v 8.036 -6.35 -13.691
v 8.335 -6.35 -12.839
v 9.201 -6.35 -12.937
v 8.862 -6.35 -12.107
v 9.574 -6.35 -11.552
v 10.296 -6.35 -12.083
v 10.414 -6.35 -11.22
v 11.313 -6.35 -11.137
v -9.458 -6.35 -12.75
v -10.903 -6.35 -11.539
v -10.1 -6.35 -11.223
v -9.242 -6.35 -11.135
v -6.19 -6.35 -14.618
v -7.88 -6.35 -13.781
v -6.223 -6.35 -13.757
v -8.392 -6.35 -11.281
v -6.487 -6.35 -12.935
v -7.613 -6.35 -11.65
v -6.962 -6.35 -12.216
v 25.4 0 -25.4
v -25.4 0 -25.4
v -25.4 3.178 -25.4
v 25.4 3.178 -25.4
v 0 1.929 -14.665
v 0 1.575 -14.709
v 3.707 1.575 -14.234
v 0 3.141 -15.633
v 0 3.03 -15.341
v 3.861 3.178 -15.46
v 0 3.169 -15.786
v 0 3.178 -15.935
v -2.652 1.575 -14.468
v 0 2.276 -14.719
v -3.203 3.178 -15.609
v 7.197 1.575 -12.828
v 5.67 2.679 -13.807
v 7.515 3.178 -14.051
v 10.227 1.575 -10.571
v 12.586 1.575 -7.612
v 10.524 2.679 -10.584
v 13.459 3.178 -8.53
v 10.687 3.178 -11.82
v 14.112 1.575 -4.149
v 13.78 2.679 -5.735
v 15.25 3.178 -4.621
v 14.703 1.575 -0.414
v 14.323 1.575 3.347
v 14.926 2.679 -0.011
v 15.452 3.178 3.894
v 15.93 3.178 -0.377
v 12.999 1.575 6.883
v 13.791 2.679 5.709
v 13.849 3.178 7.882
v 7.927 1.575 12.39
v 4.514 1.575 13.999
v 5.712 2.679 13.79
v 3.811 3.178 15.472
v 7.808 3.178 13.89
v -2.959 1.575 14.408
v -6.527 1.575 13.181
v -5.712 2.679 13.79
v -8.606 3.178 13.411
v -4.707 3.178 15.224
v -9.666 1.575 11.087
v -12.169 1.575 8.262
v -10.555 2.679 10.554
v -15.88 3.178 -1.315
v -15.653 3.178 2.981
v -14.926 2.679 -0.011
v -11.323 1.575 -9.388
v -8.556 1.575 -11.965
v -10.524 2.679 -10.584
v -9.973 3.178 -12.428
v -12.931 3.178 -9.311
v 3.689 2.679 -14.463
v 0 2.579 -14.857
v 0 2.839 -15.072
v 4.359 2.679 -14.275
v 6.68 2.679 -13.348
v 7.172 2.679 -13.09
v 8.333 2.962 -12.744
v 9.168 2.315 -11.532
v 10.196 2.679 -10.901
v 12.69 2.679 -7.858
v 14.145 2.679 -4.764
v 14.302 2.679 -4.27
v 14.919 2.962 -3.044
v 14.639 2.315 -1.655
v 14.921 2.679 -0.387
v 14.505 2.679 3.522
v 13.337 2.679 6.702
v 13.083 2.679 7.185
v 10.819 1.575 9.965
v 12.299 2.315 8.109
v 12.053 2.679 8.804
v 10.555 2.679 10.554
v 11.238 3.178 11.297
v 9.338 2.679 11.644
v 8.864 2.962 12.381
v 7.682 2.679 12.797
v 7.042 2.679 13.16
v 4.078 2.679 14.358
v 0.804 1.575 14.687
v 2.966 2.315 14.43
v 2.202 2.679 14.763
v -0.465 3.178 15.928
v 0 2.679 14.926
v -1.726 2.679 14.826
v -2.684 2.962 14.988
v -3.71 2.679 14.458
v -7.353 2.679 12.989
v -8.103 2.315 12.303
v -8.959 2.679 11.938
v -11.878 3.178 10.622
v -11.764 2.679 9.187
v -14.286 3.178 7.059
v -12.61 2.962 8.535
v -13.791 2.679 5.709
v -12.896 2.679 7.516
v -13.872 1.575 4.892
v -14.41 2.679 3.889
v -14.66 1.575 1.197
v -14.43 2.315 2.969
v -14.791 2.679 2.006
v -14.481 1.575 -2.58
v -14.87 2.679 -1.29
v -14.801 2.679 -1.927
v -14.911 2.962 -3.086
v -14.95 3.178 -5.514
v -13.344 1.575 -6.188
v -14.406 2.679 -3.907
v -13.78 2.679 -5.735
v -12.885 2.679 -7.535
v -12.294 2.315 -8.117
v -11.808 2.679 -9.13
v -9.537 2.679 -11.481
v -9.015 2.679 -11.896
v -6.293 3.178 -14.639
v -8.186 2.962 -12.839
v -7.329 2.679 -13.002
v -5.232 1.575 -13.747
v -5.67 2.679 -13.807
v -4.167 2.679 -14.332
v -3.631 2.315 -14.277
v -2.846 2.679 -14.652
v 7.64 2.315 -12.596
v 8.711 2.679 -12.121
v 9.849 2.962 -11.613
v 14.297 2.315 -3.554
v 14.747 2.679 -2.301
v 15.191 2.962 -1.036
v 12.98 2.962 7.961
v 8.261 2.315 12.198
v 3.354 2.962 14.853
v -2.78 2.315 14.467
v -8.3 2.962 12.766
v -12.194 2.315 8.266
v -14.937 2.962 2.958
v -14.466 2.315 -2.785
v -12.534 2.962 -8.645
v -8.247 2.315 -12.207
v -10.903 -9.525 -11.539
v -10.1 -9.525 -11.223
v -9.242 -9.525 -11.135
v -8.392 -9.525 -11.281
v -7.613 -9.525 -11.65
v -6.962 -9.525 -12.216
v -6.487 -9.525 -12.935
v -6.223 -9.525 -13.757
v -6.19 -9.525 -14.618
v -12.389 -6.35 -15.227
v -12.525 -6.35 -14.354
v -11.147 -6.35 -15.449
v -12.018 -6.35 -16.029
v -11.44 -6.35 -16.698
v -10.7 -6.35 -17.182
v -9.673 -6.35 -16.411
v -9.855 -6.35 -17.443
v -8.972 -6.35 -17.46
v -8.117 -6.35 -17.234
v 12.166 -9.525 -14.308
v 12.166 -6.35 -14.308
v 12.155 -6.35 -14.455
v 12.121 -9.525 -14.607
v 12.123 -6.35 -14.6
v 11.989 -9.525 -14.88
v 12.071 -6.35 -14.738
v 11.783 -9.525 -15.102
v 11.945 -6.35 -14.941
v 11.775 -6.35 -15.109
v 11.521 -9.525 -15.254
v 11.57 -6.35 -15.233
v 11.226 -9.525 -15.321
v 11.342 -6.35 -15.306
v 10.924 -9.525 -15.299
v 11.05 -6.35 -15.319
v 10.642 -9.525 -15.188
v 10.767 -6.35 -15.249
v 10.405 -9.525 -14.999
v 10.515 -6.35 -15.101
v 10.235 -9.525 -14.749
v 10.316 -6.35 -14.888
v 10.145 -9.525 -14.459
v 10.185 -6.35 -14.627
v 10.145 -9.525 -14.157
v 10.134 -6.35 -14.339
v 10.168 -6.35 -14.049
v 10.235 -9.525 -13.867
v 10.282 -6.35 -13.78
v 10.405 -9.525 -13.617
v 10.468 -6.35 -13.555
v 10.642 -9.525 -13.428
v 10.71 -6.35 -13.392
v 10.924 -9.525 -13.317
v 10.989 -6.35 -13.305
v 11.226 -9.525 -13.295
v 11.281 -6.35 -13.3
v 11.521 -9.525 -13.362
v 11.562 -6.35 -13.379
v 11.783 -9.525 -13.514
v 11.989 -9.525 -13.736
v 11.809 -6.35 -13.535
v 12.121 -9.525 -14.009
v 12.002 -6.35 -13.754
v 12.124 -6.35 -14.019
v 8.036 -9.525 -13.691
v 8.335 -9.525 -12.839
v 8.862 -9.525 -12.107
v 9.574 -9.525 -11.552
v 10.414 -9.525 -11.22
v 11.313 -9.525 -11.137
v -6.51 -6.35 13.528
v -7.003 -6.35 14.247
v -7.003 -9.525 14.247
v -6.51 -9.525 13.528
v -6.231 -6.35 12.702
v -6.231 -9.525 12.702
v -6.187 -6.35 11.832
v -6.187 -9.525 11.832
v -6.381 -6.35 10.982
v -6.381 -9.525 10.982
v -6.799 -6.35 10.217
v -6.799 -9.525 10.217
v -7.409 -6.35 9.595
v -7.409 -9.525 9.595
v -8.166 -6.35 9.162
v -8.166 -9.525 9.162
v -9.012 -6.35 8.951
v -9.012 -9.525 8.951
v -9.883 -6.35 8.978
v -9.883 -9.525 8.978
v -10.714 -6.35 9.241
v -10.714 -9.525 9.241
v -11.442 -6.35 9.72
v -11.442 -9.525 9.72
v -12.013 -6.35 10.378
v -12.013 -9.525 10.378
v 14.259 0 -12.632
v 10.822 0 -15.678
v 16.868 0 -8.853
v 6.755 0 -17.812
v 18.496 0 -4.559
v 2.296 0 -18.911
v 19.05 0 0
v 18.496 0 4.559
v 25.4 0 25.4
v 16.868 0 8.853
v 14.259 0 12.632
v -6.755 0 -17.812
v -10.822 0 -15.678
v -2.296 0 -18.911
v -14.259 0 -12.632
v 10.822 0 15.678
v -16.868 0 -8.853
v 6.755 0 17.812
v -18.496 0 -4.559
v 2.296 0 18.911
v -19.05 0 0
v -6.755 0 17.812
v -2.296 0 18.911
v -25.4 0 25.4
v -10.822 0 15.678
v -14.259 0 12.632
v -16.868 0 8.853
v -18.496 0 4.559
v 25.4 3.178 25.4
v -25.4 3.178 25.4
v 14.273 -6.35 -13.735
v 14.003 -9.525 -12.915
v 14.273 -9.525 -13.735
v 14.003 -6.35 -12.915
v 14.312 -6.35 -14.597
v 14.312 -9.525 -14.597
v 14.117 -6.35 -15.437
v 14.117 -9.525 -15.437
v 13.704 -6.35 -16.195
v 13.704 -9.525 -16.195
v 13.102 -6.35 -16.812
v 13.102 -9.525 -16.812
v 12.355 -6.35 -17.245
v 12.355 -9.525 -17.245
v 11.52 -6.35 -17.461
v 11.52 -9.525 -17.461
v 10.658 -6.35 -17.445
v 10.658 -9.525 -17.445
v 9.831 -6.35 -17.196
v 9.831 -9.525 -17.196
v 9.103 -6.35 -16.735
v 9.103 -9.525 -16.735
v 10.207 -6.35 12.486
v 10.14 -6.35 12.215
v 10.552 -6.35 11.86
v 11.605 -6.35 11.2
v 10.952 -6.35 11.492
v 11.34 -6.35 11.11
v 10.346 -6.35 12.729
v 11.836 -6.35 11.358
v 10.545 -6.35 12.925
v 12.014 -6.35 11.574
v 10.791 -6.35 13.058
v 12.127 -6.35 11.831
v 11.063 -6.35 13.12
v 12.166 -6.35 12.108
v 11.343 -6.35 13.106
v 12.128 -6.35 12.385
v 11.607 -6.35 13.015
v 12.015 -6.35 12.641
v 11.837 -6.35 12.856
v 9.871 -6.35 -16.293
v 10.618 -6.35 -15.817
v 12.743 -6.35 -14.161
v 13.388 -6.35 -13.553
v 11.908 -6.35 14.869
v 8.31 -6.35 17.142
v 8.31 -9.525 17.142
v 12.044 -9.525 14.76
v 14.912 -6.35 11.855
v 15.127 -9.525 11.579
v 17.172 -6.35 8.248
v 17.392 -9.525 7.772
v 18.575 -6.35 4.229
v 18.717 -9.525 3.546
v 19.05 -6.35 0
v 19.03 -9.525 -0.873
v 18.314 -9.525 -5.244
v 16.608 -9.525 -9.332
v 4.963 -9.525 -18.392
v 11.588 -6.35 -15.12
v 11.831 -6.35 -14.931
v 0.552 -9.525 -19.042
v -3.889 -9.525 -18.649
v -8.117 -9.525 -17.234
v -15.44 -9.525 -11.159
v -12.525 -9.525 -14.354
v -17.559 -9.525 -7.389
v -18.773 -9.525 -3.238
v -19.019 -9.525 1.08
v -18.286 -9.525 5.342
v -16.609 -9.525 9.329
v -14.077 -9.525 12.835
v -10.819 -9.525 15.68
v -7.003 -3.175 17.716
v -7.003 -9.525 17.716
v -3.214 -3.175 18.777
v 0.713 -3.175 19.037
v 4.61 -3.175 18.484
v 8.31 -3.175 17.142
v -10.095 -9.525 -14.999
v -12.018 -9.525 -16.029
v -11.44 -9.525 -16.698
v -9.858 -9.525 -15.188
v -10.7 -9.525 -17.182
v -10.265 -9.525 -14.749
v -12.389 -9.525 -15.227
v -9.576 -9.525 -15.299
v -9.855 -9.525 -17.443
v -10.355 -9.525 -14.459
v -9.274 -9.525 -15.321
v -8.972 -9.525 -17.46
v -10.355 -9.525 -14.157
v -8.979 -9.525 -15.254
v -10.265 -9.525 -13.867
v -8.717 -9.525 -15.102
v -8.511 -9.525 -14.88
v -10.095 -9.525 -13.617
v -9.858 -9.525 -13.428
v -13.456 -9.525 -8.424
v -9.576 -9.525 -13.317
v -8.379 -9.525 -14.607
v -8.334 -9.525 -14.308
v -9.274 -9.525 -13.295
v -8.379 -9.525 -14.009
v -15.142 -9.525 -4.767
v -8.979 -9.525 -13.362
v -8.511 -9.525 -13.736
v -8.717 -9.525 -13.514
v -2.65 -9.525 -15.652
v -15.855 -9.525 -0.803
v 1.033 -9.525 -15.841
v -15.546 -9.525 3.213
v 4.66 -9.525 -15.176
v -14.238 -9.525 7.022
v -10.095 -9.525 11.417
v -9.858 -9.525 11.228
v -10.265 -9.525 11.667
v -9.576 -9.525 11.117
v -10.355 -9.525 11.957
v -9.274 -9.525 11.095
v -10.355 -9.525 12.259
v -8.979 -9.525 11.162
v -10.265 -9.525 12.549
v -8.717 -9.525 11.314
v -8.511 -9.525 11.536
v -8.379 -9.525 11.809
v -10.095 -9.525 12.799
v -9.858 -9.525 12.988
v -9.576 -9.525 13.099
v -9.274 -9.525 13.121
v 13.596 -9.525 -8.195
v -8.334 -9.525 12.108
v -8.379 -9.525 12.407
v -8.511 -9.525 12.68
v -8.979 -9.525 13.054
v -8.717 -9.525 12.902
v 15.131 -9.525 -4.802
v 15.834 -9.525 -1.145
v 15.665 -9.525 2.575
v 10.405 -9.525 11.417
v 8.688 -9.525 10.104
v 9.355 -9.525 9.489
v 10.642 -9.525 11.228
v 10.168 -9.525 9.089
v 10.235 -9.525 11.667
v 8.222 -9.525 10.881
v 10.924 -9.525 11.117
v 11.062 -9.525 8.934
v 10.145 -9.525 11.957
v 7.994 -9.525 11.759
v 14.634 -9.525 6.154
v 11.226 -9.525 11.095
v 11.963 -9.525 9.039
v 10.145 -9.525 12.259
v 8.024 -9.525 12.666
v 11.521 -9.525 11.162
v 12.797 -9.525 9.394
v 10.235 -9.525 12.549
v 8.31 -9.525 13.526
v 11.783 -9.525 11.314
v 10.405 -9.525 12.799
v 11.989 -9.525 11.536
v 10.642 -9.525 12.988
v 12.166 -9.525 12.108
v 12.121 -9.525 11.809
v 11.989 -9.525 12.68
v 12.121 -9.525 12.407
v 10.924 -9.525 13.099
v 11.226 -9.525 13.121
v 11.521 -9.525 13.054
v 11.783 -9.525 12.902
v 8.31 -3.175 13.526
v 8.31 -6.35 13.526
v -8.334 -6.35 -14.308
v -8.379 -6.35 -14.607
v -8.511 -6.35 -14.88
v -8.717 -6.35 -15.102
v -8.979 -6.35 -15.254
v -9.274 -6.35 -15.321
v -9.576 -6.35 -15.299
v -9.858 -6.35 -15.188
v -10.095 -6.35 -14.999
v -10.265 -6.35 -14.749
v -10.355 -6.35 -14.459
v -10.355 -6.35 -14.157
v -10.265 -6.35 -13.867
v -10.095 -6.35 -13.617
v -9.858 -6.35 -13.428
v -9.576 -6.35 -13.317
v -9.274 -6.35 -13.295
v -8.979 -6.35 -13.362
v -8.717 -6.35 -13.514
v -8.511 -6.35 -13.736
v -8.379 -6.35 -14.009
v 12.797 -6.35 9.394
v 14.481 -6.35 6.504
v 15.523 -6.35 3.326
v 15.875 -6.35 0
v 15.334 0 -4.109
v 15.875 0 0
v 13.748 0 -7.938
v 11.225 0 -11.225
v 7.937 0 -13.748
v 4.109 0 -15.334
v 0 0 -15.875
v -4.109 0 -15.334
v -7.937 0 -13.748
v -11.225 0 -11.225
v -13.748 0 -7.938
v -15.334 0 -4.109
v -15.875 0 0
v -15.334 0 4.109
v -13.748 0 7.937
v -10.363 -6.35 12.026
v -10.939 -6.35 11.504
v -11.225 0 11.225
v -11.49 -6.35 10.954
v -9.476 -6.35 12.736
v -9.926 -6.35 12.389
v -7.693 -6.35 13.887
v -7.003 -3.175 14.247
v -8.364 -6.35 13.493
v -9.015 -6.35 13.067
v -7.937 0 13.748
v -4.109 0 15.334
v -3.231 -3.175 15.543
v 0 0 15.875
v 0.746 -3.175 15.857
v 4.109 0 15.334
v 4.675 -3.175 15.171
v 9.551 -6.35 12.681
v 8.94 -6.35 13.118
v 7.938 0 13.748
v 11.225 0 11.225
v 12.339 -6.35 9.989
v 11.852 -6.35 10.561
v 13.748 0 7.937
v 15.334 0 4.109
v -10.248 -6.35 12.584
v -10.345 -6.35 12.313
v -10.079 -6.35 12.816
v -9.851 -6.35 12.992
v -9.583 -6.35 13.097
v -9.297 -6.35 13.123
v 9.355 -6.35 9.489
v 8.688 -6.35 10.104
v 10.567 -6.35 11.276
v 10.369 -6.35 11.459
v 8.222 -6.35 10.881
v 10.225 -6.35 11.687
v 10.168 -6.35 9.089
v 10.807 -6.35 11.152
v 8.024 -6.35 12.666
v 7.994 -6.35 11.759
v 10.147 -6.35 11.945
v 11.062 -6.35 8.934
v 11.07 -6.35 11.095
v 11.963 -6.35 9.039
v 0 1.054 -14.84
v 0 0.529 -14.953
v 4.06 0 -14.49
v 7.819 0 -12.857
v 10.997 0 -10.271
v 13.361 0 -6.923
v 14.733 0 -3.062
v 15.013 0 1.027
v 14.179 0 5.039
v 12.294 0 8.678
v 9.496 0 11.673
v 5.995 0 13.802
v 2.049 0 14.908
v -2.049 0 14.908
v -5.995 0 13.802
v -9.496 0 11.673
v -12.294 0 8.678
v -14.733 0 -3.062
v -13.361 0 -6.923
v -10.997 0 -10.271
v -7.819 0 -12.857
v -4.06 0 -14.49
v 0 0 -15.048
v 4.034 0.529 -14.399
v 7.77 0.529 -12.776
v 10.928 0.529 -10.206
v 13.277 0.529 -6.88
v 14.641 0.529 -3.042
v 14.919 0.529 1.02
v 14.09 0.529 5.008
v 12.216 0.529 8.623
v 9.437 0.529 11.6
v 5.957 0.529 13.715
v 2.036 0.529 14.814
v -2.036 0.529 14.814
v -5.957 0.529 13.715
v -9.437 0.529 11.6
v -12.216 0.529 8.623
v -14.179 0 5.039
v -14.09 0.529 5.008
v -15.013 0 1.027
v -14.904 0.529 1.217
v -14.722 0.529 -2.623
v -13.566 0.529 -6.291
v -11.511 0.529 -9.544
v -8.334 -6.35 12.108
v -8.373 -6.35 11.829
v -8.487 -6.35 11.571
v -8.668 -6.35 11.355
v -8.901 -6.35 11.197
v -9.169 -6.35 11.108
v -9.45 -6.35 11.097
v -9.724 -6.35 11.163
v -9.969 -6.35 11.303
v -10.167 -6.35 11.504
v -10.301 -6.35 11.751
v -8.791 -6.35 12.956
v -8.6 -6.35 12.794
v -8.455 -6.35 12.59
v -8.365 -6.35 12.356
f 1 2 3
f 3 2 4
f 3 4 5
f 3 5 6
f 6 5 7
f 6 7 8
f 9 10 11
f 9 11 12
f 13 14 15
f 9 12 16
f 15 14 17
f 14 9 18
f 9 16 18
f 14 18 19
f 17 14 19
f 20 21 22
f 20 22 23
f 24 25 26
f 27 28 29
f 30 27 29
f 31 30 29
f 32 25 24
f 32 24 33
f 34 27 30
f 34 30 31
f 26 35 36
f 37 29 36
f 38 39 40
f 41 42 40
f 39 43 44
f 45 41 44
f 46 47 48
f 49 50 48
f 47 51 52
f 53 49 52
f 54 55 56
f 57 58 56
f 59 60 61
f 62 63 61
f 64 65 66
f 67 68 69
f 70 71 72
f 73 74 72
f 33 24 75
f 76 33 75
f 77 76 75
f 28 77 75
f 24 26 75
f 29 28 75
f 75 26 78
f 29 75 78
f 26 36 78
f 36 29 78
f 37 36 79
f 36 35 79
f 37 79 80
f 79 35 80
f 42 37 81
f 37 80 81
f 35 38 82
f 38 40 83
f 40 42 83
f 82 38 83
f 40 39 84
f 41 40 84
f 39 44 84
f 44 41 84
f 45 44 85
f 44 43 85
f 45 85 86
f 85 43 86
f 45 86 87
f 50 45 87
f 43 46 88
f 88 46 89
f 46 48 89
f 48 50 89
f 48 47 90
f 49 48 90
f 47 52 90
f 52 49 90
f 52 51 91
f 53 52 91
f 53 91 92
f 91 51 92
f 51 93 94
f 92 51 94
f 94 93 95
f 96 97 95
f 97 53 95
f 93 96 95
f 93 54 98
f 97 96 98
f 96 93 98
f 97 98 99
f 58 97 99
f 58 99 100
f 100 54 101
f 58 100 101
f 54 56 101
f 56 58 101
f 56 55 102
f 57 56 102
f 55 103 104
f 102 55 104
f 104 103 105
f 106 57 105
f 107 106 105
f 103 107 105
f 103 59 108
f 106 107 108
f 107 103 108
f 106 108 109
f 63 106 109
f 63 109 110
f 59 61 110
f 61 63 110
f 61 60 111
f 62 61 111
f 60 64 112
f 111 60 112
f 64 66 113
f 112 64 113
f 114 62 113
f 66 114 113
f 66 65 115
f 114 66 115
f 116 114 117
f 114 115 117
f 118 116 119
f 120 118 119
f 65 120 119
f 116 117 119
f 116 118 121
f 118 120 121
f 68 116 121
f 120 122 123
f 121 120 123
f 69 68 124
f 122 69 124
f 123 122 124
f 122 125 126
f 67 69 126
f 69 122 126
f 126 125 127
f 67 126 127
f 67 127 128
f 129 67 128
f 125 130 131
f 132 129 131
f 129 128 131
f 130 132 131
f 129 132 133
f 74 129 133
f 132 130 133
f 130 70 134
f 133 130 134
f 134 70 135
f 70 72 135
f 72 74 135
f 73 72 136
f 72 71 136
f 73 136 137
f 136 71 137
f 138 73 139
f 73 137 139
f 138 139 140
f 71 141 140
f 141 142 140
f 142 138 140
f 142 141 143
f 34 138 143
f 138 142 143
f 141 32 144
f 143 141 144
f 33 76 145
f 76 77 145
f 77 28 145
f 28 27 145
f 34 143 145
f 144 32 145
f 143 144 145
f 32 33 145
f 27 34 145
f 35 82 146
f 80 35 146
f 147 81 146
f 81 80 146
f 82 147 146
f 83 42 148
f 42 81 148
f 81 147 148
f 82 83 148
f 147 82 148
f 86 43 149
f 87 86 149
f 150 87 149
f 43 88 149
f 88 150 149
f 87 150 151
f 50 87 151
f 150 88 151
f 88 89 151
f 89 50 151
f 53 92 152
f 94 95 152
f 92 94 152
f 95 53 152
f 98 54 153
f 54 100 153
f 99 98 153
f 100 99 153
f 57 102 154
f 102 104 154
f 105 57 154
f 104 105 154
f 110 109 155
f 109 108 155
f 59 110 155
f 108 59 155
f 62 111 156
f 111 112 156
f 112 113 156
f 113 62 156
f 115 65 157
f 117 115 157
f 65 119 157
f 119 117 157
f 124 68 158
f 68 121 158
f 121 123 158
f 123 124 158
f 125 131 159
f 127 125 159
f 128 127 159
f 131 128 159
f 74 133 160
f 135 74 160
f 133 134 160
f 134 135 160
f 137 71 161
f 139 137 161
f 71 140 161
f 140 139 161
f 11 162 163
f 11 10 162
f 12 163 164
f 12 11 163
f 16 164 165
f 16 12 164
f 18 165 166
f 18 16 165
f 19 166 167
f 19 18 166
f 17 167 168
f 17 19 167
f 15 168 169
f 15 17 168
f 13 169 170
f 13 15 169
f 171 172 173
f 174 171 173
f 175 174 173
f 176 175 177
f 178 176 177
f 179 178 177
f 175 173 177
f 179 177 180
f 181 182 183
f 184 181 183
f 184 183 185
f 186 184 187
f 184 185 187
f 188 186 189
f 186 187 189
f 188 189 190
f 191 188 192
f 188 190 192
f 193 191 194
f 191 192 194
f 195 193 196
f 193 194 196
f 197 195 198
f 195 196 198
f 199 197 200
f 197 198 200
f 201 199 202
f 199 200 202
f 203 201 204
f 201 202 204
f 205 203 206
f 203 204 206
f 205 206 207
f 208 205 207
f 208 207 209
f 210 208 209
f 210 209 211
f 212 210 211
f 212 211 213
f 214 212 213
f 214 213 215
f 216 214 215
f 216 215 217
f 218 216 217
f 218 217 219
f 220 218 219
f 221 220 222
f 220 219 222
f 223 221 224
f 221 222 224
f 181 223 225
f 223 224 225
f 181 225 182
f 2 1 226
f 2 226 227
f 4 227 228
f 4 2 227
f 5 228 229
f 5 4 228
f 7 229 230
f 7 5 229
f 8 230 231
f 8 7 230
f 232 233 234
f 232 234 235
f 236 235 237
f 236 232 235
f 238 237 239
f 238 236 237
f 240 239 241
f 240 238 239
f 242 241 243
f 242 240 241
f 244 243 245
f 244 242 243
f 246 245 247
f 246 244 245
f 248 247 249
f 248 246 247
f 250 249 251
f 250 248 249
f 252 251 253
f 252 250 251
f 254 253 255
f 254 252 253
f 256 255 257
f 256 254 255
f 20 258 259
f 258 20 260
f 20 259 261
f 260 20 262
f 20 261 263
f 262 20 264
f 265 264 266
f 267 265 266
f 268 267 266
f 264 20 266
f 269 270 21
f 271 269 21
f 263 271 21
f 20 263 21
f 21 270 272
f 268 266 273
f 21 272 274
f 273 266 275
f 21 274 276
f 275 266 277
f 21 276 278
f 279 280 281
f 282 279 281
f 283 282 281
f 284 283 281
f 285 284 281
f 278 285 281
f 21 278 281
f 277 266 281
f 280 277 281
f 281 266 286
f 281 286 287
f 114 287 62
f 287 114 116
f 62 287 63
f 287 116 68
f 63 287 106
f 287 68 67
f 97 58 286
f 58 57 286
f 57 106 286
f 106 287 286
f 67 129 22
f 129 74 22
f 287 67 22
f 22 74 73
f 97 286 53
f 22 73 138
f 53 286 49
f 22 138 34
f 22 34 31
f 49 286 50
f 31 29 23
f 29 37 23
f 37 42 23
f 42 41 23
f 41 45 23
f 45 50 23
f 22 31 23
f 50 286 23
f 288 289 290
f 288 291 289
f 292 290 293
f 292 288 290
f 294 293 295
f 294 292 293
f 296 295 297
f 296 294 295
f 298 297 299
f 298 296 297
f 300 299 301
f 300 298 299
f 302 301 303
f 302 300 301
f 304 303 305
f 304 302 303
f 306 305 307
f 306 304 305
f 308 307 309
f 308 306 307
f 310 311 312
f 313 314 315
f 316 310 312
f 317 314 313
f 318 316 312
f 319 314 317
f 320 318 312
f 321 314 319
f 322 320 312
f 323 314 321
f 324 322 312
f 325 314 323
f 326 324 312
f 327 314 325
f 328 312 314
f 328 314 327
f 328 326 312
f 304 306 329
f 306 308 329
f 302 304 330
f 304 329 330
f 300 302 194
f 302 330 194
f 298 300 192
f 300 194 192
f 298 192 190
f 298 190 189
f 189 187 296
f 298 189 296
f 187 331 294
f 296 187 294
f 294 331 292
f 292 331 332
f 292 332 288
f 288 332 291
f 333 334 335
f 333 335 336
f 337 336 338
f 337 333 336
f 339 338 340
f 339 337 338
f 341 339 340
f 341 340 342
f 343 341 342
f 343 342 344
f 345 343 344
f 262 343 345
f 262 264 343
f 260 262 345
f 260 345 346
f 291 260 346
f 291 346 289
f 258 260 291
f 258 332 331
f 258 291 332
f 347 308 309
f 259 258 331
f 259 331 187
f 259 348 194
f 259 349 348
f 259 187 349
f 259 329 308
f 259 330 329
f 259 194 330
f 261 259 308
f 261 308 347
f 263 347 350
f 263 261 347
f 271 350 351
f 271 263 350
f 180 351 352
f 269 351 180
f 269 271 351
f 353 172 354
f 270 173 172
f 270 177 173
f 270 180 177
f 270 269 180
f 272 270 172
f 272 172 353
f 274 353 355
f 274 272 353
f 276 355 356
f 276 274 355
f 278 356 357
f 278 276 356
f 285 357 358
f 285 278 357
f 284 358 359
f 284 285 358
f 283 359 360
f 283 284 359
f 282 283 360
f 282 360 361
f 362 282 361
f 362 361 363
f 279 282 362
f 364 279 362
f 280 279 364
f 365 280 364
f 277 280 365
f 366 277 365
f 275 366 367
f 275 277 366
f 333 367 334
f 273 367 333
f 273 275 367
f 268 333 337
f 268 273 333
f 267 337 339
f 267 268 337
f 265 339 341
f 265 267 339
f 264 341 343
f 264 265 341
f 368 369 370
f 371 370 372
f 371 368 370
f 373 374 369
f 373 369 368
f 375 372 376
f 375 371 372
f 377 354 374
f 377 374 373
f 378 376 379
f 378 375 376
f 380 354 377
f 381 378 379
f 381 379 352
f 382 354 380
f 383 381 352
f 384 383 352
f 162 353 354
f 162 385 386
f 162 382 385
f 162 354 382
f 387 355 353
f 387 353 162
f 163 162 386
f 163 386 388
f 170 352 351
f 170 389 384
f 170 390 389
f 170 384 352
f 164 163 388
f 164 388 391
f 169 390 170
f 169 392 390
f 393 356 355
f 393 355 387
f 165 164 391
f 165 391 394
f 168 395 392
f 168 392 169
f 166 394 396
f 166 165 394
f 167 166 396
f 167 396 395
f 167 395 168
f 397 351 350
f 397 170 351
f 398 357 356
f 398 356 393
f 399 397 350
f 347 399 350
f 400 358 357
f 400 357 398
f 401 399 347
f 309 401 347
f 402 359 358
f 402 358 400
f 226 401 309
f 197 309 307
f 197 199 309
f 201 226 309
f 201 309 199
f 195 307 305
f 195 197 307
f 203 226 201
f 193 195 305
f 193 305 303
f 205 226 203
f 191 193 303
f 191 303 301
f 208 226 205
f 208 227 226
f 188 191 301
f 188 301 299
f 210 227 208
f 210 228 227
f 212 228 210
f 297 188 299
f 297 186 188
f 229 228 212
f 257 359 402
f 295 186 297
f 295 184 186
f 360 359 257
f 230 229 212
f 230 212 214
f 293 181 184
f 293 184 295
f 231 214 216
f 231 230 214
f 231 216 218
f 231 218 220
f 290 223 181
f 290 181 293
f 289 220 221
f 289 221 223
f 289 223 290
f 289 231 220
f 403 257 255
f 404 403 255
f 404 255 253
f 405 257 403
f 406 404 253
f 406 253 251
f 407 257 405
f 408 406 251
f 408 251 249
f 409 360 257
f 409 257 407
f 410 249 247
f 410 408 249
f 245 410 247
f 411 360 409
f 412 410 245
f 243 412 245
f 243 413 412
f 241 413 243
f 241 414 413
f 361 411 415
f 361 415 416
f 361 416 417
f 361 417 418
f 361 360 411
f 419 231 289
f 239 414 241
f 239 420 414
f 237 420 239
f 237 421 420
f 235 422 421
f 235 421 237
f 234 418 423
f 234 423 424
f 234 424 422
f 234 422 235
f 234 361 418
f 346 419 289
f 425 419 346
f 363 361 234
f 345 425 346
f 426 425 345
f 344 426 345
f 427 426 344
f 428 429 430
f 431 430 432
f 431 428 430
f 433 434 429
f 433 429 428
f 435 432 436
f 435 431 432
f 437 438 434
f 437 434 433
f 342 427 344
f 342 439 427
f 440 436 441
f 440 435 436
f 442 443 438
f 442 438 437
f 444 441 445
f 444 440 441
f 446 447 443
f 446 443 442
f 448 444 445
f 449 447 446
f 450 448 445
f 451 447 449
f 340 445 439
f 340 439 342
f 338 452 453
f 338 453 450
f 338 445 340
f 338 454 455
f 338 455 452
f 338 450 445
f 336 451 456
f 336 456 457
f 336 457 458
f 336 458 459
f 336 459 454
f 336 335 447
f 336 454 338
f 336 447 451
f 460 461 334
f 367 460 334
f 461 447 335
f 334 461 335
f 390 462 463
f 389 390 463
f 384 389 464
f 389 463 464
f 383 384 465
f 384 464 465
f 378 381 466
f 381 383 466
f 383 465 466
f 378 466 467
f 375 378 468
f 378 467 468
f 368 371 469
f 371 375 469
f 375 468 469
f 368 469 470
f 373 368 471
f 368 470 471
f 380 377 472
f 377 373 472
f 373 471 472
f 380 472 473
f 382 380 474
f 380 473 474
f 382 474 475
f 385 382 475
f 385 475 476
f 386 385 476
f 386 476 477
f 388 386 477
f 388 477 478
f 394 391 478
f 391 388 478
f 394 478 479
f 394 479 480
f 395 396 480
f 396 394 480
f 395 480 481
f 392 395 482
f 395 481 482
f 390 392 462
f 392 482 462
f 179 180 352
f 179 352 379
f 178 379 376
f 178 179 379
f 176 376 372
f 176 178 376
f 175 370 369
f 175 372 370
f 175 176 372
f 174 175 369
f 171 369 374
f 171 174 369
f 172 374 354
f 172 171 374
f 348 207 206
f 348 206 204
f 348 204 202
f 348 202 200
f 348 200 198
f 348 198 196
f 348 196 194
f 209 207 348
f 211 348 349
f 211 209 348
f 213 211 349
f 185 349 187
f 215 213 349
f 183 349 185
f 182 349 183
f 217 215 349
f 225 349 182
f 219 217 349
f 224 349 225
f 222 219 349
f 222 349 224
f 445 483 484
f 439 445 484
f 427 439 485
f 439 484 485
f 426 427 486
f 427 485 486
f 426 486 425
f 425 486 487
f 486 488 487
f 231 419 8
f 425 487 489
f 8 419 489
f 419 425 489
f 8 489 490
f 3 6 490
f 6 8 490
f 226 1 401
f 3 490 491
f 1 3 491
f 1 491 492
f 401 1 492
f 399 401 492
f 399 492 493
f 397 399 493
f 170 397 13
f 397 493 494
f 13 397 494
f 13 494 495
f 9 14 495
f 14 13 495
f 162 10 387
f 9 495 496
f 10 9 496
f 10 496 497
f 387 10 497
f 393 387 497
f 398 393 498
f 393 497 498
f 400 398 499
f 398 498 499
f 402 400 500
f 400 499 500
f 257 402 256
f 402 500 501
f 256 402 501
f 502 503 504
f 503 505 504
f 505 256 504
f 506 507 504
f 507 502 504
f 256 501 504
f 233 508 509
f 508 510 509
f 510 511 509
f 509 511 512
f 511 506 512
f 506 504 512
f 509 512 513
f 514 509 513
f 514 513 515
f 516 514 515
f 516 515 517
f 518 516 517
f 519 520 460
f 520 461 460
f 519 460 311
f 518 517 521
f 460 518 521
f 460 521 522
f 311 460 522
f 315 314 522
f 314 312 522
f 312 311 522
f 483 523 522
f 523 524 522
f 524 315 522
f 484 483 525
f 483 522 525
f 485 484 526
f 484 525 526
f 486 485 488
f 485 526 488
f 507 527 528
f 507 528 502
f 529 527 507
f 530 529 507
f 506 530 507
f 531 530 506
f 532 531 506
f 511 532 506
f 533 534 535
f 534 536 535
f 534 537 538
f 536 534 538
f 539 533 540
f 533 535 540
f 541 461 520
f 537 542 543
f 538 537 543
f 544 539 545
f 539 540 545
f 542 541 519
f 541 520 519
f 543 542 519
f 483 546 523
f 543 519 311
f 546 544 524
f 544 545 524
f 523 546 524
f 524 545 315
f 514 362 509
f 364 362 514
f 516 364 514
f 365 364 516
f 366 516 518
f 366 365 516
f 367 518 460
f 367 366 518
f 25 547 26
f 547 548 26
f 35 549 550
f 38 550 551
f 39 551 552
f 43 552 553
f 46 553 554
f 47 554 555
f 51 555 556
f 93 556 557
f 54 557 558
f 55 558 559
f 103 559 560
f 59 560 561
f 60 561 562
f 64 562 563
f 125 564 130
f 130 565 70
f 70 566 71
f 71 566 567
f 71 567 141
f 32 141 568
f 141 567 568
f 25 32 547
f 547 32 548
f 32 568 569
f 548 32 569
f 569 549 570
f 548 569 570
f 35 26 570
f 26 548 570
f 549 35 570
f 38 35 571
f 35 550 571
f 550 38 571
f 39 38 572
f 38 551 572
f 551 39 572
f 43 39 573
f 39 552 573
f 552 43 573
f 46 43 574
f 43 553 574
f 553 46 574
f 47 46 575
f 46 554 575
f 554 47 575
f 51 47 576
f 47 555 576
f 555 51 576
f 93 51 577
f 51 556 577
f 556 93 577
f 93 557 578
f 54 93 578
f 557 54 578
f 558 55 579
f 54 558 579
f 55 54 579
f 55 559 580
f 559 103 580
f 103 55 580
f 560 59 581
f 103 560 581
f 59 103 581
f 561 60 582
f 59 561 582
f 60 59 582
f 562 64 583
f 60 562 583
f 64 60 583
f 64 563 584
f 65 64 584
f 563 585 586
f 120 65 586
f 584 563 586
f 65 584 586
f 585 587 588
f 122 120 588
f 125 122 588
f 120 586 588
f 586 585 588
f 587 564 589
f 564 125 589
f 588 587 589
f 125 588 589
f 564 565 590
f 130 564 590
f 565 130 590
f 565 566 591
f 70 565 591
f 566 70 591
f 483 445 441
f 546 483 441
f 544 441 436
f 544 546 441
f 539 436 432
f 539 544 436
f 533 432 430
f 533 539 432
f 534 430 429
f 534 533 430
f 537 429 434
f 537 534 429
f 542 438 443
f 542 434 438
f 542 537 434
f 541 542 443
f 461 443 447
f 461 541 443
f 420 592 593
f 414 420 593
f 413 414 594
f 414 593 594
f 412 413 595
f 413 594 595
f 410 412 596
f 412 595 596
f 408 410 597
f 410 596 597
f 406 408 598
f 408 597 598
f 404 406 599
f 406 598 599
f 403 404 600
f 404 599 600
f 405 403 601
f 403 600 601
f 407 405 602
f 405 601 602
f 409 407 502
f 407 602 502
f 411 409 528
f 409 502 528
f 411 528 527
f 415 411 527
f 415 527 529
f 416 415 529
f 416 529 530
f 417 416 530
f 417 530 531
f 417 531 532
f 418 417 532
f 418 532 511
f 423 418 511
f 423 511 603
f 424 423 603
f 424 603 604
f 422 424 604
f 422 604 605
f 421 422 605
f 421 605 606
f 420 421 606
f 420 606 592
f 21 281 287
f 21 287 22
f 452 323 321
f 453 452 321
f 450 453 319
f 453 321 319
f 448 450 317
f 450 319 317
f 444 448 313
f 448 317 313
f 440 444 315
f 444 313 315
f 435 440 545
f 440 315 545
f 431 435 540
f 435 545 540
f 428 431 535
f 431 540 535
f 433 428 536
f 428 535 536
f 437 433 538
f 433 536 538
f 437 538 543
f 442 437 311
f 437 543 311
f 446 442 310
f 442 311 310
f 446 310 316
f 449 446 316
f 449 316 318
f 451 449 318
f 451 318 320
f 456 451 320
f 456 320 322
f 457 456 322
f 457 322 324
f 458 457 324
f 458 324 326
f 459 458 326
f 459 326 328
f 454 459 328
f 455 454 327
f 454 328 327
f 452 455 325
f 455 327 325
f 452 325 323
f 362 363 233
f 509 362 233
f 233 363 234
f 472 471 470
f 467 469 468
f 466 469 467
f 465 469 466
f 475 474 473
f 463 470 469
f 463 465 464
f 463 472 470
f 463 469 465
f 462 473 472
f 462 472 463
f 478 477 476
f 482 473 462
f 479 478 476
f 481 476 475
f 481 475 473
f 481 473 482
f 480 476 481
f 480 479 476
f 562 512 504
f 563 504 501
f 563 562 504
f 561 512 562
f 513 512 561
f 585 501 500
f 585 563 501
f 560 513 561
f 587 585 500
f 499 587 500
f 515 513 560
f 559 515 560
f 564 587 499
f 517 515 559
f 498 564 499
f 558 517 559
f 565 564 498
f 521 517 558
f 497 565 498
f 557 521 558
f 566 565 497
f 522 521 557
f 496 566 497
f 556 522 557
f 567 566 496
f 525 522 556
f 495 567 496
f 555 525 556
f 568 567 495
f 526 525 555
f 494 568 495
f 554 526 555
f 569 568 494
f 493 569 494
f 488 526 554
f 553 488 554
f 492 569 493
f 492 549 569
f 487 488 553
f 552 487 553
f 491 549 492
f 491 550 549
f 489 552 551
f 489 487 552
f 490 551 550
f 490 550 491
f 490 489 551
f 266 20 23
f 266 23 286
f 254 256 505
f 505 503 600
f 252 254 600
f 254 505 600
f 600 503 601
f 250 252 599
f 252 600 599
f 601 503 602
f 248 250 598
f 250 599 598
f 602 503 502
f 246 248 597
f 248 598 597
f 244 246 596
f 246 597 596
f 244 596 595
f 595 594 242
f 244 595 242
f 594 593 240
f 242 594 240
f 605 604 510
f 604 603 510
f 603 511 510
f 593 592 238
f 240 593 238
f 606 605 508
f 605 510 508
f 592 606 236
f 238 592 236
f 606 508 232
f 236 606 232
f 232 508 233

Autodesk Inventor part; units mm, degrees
ref_plane "YZ Plane" through (0, 0, 0) normal (1, 0, 0) x (0, 1, 0)
sketch "Sketch1" plane through (0, 0, 0) normal (0, 1, 0) x (-1, 0, 0)
  line L0 (-25.4, 25.4) -> (25.4, 25.4)
  line L1 (25.4, 25.4) -> (25.4, -25.4)
  line L2 (25.4, -25.4) -> (-25.4, -25.4)
  line L3 (-25.4, -25.4) -> (-25.4, 25.4)
  line L4 (-25.4, 25.4) -> (25.4, -25.4) construction
  line L5 (25.4, 25.4) -> (-25.4, -25.4) construction
  point P0 (0, 0)
  dimension "d0" = 50.8
  dimension "d1" = 50.8
extrude "Extrusion1" add sketch "Sketch1" along normal blind 3.1775
sketch "Sketch2" plane through (0, 0, 0) normal (0, -1, 0) x (1, 0, 0)
  circle A0 centre (0, 0) radius 15.875
  dimension "d4" = 31.75
extrude "Extrusion2" cut sketch "Sketch2" against normal blind 3.1775
sketch "Sketch3" plane through (0, 0, 0) normal (0, -1, 0) x (1, 0, 0)
  circle A0 centre (0, 0) radius 19.05
  circle A1 centre (0, 0) radius 15.875 projected
  dimension "d7" = 38.1
extrude "Extrusion3" add sketch "Sketch3" along normal blind 6.35
sketch "Sketch4" plane through (0, -6.35, 0) normal (0, -1, 0) x (1, 0, 0)
  circle A0 centre (0, 0) radius 19.05 projected
  line L0 (-9.35, 12.108) -> (11.15, 12.108) construction
  line L1 (11.15, 12.108) -> (11.15, -14.308) construction
  line L2 (11.15, -14.308) -> (-9.35, -14.308) construction
  line L3 (-9.35, -14.308) -> (-9.35, 12.108) construction
  circle A1 centre (11.15, -14.308) radius 1.016
  circle A2 centre (11.15, 12.108) radius 1.016
  circle A3 centre (-9.35, 12.108) radius 1.016
  circle A4 centre (-9.35, -14.308) radius 1.016
  circle A5 centre (0, 0) radius 15.875 projected
  circle A6 centre (0, 0) radius 19.05
  circle A7 centre (0, 0) radius 15.875
  circle A8 centre (11.15, -14.308) radius 3.175
  circle A9 centre (-9.35, -14.308) radius 3.175
  circle A10 centre (-9.35, 12.108) radius 3.175
  circle A11 centre (11.15, 12.108) radius 3.175
  line L4 (8.3095, 13.5265) -> (8.3095, 17.1422)
  line L5 (-7.0034, 14.2467) -> (-7.0034, 17.716)
  point P0 (11.15, -1.1)
  point P1 (0.9, 12.108)
  point P2 (14.0033, -12.9155)
  point P3 (-12.5247, -14.3539)
  point P4 (-8.1174, -17.234)
  point P5 (9.1025, -16.7346)
  point P6 (-12.0126, 10.3785)
  point P7 (-7.0034, 14.2467)
  point P8 (8.3095, 13.5265)
  point P9 (12.7973, 9.3938)
  point P10 (11.3128, -11.1372)
  point P11 (8.0355, -13.6911)
  point P12 (-6.1902, -14.6184)
  point P13 (-10.9029, -11.5387)
  dimension "d10" = 20.5
  dimension "d11" = 26.416
  dimension "d15" = 2.032
  dimension "d25" = 6.35
  dimension "d26" = 1.1
  dimension "d35" = 0.9
ref_plane "Work Plane2" through (0, -9.525, 0) normal (0, -1, 0) x (1, 0, 0)
sketch "Sketch5" plane through (0, -9.525, 0) normal (0, -1, 0) x (1, 0, 0)
  circle A0 centre (0, 0) radius 15.875 projected
ref_plane "Work Plane1" through (0, 0, -25.4) normal (-1, 0, 0) x (0, 0, 1)
sketch "Sketch6" plane through (0, 0, -25.4) normal (-1, 0, 0) x (0, 0, 1)
  arc A0 (11.2224, 3.1775) -> (10.3522, 0) centre (25.4, -2.413) ccw
  line L0 (9.525, -6.35) -> (9.525, 3.1775) projected
  line L1 (9.525, 3.1775) -> (41.275, 3.1775) projected
  line L2 (44.45, 0) -> (6.35, 0) projected
  line L3 (11.2224, 3.1775) -> (9.525, 3.1775)
  line L4 (9.525, 3.1775) -> (9.525, 0)
  line L5 (9.525, 0) -> (10.3522, 0)
  line L6 (9.525, -9.525) -> (41.275, -9.525) projected
  line L7 (25.4, -2.413) -> (25.4, -9.525)
  point P0 (25.4, 0)
  point P1 (25.4, -5.969)
  dimension "d21" = 30.48
  dimension "d29" = 7.112
revolve "Revolution1" add sketch "Sketch6" angle 360 about axis through (0, -2.413, 0) along (0, -1, 0)
fillet "Fillet1" radius 1.27 1 edges at (0, 3.1775, 14.1776)
extrude "Extrusion7" add sketch "Sketch4" along normal blind 3.175 contours A0 A11 L4 | L5 A10 A5 A9 A0 | A0 A11 A5 A2 | A5 A2 A11 | A9 A5 A0 | A0 A9 | A10 A5 A3 | A5 A3 A10 | A0 A8 A5 A11 | A9 A5 A8 A0 | A9 A5 | A8 A5 A0 A1 | A0 A1 A8 | A5 A8
sketch "Sketch7" plane through (0, -6.35, 0) normal (0, -1, 0) x (1, 0, 0)
  line L0 (-7.0034, 17.716) -> (-7.0034, 14.2467) projected
  arc A0 (8.3095, 13.5265) -> (-7.0034, 14.2467) centre (0, 0) ccw projected
  line L1 (8.3095, 13.5265) -> (8.3095, 17.1422) projected
  arc A1 (8.3095, 17.1422) -> (-7.0034, 17.716) centre (0, 0) ccw projected
extrude "Extrusion8" cut sketch "Sketch7" against normal blind 3.175
properties part number "JoystickInsert"
